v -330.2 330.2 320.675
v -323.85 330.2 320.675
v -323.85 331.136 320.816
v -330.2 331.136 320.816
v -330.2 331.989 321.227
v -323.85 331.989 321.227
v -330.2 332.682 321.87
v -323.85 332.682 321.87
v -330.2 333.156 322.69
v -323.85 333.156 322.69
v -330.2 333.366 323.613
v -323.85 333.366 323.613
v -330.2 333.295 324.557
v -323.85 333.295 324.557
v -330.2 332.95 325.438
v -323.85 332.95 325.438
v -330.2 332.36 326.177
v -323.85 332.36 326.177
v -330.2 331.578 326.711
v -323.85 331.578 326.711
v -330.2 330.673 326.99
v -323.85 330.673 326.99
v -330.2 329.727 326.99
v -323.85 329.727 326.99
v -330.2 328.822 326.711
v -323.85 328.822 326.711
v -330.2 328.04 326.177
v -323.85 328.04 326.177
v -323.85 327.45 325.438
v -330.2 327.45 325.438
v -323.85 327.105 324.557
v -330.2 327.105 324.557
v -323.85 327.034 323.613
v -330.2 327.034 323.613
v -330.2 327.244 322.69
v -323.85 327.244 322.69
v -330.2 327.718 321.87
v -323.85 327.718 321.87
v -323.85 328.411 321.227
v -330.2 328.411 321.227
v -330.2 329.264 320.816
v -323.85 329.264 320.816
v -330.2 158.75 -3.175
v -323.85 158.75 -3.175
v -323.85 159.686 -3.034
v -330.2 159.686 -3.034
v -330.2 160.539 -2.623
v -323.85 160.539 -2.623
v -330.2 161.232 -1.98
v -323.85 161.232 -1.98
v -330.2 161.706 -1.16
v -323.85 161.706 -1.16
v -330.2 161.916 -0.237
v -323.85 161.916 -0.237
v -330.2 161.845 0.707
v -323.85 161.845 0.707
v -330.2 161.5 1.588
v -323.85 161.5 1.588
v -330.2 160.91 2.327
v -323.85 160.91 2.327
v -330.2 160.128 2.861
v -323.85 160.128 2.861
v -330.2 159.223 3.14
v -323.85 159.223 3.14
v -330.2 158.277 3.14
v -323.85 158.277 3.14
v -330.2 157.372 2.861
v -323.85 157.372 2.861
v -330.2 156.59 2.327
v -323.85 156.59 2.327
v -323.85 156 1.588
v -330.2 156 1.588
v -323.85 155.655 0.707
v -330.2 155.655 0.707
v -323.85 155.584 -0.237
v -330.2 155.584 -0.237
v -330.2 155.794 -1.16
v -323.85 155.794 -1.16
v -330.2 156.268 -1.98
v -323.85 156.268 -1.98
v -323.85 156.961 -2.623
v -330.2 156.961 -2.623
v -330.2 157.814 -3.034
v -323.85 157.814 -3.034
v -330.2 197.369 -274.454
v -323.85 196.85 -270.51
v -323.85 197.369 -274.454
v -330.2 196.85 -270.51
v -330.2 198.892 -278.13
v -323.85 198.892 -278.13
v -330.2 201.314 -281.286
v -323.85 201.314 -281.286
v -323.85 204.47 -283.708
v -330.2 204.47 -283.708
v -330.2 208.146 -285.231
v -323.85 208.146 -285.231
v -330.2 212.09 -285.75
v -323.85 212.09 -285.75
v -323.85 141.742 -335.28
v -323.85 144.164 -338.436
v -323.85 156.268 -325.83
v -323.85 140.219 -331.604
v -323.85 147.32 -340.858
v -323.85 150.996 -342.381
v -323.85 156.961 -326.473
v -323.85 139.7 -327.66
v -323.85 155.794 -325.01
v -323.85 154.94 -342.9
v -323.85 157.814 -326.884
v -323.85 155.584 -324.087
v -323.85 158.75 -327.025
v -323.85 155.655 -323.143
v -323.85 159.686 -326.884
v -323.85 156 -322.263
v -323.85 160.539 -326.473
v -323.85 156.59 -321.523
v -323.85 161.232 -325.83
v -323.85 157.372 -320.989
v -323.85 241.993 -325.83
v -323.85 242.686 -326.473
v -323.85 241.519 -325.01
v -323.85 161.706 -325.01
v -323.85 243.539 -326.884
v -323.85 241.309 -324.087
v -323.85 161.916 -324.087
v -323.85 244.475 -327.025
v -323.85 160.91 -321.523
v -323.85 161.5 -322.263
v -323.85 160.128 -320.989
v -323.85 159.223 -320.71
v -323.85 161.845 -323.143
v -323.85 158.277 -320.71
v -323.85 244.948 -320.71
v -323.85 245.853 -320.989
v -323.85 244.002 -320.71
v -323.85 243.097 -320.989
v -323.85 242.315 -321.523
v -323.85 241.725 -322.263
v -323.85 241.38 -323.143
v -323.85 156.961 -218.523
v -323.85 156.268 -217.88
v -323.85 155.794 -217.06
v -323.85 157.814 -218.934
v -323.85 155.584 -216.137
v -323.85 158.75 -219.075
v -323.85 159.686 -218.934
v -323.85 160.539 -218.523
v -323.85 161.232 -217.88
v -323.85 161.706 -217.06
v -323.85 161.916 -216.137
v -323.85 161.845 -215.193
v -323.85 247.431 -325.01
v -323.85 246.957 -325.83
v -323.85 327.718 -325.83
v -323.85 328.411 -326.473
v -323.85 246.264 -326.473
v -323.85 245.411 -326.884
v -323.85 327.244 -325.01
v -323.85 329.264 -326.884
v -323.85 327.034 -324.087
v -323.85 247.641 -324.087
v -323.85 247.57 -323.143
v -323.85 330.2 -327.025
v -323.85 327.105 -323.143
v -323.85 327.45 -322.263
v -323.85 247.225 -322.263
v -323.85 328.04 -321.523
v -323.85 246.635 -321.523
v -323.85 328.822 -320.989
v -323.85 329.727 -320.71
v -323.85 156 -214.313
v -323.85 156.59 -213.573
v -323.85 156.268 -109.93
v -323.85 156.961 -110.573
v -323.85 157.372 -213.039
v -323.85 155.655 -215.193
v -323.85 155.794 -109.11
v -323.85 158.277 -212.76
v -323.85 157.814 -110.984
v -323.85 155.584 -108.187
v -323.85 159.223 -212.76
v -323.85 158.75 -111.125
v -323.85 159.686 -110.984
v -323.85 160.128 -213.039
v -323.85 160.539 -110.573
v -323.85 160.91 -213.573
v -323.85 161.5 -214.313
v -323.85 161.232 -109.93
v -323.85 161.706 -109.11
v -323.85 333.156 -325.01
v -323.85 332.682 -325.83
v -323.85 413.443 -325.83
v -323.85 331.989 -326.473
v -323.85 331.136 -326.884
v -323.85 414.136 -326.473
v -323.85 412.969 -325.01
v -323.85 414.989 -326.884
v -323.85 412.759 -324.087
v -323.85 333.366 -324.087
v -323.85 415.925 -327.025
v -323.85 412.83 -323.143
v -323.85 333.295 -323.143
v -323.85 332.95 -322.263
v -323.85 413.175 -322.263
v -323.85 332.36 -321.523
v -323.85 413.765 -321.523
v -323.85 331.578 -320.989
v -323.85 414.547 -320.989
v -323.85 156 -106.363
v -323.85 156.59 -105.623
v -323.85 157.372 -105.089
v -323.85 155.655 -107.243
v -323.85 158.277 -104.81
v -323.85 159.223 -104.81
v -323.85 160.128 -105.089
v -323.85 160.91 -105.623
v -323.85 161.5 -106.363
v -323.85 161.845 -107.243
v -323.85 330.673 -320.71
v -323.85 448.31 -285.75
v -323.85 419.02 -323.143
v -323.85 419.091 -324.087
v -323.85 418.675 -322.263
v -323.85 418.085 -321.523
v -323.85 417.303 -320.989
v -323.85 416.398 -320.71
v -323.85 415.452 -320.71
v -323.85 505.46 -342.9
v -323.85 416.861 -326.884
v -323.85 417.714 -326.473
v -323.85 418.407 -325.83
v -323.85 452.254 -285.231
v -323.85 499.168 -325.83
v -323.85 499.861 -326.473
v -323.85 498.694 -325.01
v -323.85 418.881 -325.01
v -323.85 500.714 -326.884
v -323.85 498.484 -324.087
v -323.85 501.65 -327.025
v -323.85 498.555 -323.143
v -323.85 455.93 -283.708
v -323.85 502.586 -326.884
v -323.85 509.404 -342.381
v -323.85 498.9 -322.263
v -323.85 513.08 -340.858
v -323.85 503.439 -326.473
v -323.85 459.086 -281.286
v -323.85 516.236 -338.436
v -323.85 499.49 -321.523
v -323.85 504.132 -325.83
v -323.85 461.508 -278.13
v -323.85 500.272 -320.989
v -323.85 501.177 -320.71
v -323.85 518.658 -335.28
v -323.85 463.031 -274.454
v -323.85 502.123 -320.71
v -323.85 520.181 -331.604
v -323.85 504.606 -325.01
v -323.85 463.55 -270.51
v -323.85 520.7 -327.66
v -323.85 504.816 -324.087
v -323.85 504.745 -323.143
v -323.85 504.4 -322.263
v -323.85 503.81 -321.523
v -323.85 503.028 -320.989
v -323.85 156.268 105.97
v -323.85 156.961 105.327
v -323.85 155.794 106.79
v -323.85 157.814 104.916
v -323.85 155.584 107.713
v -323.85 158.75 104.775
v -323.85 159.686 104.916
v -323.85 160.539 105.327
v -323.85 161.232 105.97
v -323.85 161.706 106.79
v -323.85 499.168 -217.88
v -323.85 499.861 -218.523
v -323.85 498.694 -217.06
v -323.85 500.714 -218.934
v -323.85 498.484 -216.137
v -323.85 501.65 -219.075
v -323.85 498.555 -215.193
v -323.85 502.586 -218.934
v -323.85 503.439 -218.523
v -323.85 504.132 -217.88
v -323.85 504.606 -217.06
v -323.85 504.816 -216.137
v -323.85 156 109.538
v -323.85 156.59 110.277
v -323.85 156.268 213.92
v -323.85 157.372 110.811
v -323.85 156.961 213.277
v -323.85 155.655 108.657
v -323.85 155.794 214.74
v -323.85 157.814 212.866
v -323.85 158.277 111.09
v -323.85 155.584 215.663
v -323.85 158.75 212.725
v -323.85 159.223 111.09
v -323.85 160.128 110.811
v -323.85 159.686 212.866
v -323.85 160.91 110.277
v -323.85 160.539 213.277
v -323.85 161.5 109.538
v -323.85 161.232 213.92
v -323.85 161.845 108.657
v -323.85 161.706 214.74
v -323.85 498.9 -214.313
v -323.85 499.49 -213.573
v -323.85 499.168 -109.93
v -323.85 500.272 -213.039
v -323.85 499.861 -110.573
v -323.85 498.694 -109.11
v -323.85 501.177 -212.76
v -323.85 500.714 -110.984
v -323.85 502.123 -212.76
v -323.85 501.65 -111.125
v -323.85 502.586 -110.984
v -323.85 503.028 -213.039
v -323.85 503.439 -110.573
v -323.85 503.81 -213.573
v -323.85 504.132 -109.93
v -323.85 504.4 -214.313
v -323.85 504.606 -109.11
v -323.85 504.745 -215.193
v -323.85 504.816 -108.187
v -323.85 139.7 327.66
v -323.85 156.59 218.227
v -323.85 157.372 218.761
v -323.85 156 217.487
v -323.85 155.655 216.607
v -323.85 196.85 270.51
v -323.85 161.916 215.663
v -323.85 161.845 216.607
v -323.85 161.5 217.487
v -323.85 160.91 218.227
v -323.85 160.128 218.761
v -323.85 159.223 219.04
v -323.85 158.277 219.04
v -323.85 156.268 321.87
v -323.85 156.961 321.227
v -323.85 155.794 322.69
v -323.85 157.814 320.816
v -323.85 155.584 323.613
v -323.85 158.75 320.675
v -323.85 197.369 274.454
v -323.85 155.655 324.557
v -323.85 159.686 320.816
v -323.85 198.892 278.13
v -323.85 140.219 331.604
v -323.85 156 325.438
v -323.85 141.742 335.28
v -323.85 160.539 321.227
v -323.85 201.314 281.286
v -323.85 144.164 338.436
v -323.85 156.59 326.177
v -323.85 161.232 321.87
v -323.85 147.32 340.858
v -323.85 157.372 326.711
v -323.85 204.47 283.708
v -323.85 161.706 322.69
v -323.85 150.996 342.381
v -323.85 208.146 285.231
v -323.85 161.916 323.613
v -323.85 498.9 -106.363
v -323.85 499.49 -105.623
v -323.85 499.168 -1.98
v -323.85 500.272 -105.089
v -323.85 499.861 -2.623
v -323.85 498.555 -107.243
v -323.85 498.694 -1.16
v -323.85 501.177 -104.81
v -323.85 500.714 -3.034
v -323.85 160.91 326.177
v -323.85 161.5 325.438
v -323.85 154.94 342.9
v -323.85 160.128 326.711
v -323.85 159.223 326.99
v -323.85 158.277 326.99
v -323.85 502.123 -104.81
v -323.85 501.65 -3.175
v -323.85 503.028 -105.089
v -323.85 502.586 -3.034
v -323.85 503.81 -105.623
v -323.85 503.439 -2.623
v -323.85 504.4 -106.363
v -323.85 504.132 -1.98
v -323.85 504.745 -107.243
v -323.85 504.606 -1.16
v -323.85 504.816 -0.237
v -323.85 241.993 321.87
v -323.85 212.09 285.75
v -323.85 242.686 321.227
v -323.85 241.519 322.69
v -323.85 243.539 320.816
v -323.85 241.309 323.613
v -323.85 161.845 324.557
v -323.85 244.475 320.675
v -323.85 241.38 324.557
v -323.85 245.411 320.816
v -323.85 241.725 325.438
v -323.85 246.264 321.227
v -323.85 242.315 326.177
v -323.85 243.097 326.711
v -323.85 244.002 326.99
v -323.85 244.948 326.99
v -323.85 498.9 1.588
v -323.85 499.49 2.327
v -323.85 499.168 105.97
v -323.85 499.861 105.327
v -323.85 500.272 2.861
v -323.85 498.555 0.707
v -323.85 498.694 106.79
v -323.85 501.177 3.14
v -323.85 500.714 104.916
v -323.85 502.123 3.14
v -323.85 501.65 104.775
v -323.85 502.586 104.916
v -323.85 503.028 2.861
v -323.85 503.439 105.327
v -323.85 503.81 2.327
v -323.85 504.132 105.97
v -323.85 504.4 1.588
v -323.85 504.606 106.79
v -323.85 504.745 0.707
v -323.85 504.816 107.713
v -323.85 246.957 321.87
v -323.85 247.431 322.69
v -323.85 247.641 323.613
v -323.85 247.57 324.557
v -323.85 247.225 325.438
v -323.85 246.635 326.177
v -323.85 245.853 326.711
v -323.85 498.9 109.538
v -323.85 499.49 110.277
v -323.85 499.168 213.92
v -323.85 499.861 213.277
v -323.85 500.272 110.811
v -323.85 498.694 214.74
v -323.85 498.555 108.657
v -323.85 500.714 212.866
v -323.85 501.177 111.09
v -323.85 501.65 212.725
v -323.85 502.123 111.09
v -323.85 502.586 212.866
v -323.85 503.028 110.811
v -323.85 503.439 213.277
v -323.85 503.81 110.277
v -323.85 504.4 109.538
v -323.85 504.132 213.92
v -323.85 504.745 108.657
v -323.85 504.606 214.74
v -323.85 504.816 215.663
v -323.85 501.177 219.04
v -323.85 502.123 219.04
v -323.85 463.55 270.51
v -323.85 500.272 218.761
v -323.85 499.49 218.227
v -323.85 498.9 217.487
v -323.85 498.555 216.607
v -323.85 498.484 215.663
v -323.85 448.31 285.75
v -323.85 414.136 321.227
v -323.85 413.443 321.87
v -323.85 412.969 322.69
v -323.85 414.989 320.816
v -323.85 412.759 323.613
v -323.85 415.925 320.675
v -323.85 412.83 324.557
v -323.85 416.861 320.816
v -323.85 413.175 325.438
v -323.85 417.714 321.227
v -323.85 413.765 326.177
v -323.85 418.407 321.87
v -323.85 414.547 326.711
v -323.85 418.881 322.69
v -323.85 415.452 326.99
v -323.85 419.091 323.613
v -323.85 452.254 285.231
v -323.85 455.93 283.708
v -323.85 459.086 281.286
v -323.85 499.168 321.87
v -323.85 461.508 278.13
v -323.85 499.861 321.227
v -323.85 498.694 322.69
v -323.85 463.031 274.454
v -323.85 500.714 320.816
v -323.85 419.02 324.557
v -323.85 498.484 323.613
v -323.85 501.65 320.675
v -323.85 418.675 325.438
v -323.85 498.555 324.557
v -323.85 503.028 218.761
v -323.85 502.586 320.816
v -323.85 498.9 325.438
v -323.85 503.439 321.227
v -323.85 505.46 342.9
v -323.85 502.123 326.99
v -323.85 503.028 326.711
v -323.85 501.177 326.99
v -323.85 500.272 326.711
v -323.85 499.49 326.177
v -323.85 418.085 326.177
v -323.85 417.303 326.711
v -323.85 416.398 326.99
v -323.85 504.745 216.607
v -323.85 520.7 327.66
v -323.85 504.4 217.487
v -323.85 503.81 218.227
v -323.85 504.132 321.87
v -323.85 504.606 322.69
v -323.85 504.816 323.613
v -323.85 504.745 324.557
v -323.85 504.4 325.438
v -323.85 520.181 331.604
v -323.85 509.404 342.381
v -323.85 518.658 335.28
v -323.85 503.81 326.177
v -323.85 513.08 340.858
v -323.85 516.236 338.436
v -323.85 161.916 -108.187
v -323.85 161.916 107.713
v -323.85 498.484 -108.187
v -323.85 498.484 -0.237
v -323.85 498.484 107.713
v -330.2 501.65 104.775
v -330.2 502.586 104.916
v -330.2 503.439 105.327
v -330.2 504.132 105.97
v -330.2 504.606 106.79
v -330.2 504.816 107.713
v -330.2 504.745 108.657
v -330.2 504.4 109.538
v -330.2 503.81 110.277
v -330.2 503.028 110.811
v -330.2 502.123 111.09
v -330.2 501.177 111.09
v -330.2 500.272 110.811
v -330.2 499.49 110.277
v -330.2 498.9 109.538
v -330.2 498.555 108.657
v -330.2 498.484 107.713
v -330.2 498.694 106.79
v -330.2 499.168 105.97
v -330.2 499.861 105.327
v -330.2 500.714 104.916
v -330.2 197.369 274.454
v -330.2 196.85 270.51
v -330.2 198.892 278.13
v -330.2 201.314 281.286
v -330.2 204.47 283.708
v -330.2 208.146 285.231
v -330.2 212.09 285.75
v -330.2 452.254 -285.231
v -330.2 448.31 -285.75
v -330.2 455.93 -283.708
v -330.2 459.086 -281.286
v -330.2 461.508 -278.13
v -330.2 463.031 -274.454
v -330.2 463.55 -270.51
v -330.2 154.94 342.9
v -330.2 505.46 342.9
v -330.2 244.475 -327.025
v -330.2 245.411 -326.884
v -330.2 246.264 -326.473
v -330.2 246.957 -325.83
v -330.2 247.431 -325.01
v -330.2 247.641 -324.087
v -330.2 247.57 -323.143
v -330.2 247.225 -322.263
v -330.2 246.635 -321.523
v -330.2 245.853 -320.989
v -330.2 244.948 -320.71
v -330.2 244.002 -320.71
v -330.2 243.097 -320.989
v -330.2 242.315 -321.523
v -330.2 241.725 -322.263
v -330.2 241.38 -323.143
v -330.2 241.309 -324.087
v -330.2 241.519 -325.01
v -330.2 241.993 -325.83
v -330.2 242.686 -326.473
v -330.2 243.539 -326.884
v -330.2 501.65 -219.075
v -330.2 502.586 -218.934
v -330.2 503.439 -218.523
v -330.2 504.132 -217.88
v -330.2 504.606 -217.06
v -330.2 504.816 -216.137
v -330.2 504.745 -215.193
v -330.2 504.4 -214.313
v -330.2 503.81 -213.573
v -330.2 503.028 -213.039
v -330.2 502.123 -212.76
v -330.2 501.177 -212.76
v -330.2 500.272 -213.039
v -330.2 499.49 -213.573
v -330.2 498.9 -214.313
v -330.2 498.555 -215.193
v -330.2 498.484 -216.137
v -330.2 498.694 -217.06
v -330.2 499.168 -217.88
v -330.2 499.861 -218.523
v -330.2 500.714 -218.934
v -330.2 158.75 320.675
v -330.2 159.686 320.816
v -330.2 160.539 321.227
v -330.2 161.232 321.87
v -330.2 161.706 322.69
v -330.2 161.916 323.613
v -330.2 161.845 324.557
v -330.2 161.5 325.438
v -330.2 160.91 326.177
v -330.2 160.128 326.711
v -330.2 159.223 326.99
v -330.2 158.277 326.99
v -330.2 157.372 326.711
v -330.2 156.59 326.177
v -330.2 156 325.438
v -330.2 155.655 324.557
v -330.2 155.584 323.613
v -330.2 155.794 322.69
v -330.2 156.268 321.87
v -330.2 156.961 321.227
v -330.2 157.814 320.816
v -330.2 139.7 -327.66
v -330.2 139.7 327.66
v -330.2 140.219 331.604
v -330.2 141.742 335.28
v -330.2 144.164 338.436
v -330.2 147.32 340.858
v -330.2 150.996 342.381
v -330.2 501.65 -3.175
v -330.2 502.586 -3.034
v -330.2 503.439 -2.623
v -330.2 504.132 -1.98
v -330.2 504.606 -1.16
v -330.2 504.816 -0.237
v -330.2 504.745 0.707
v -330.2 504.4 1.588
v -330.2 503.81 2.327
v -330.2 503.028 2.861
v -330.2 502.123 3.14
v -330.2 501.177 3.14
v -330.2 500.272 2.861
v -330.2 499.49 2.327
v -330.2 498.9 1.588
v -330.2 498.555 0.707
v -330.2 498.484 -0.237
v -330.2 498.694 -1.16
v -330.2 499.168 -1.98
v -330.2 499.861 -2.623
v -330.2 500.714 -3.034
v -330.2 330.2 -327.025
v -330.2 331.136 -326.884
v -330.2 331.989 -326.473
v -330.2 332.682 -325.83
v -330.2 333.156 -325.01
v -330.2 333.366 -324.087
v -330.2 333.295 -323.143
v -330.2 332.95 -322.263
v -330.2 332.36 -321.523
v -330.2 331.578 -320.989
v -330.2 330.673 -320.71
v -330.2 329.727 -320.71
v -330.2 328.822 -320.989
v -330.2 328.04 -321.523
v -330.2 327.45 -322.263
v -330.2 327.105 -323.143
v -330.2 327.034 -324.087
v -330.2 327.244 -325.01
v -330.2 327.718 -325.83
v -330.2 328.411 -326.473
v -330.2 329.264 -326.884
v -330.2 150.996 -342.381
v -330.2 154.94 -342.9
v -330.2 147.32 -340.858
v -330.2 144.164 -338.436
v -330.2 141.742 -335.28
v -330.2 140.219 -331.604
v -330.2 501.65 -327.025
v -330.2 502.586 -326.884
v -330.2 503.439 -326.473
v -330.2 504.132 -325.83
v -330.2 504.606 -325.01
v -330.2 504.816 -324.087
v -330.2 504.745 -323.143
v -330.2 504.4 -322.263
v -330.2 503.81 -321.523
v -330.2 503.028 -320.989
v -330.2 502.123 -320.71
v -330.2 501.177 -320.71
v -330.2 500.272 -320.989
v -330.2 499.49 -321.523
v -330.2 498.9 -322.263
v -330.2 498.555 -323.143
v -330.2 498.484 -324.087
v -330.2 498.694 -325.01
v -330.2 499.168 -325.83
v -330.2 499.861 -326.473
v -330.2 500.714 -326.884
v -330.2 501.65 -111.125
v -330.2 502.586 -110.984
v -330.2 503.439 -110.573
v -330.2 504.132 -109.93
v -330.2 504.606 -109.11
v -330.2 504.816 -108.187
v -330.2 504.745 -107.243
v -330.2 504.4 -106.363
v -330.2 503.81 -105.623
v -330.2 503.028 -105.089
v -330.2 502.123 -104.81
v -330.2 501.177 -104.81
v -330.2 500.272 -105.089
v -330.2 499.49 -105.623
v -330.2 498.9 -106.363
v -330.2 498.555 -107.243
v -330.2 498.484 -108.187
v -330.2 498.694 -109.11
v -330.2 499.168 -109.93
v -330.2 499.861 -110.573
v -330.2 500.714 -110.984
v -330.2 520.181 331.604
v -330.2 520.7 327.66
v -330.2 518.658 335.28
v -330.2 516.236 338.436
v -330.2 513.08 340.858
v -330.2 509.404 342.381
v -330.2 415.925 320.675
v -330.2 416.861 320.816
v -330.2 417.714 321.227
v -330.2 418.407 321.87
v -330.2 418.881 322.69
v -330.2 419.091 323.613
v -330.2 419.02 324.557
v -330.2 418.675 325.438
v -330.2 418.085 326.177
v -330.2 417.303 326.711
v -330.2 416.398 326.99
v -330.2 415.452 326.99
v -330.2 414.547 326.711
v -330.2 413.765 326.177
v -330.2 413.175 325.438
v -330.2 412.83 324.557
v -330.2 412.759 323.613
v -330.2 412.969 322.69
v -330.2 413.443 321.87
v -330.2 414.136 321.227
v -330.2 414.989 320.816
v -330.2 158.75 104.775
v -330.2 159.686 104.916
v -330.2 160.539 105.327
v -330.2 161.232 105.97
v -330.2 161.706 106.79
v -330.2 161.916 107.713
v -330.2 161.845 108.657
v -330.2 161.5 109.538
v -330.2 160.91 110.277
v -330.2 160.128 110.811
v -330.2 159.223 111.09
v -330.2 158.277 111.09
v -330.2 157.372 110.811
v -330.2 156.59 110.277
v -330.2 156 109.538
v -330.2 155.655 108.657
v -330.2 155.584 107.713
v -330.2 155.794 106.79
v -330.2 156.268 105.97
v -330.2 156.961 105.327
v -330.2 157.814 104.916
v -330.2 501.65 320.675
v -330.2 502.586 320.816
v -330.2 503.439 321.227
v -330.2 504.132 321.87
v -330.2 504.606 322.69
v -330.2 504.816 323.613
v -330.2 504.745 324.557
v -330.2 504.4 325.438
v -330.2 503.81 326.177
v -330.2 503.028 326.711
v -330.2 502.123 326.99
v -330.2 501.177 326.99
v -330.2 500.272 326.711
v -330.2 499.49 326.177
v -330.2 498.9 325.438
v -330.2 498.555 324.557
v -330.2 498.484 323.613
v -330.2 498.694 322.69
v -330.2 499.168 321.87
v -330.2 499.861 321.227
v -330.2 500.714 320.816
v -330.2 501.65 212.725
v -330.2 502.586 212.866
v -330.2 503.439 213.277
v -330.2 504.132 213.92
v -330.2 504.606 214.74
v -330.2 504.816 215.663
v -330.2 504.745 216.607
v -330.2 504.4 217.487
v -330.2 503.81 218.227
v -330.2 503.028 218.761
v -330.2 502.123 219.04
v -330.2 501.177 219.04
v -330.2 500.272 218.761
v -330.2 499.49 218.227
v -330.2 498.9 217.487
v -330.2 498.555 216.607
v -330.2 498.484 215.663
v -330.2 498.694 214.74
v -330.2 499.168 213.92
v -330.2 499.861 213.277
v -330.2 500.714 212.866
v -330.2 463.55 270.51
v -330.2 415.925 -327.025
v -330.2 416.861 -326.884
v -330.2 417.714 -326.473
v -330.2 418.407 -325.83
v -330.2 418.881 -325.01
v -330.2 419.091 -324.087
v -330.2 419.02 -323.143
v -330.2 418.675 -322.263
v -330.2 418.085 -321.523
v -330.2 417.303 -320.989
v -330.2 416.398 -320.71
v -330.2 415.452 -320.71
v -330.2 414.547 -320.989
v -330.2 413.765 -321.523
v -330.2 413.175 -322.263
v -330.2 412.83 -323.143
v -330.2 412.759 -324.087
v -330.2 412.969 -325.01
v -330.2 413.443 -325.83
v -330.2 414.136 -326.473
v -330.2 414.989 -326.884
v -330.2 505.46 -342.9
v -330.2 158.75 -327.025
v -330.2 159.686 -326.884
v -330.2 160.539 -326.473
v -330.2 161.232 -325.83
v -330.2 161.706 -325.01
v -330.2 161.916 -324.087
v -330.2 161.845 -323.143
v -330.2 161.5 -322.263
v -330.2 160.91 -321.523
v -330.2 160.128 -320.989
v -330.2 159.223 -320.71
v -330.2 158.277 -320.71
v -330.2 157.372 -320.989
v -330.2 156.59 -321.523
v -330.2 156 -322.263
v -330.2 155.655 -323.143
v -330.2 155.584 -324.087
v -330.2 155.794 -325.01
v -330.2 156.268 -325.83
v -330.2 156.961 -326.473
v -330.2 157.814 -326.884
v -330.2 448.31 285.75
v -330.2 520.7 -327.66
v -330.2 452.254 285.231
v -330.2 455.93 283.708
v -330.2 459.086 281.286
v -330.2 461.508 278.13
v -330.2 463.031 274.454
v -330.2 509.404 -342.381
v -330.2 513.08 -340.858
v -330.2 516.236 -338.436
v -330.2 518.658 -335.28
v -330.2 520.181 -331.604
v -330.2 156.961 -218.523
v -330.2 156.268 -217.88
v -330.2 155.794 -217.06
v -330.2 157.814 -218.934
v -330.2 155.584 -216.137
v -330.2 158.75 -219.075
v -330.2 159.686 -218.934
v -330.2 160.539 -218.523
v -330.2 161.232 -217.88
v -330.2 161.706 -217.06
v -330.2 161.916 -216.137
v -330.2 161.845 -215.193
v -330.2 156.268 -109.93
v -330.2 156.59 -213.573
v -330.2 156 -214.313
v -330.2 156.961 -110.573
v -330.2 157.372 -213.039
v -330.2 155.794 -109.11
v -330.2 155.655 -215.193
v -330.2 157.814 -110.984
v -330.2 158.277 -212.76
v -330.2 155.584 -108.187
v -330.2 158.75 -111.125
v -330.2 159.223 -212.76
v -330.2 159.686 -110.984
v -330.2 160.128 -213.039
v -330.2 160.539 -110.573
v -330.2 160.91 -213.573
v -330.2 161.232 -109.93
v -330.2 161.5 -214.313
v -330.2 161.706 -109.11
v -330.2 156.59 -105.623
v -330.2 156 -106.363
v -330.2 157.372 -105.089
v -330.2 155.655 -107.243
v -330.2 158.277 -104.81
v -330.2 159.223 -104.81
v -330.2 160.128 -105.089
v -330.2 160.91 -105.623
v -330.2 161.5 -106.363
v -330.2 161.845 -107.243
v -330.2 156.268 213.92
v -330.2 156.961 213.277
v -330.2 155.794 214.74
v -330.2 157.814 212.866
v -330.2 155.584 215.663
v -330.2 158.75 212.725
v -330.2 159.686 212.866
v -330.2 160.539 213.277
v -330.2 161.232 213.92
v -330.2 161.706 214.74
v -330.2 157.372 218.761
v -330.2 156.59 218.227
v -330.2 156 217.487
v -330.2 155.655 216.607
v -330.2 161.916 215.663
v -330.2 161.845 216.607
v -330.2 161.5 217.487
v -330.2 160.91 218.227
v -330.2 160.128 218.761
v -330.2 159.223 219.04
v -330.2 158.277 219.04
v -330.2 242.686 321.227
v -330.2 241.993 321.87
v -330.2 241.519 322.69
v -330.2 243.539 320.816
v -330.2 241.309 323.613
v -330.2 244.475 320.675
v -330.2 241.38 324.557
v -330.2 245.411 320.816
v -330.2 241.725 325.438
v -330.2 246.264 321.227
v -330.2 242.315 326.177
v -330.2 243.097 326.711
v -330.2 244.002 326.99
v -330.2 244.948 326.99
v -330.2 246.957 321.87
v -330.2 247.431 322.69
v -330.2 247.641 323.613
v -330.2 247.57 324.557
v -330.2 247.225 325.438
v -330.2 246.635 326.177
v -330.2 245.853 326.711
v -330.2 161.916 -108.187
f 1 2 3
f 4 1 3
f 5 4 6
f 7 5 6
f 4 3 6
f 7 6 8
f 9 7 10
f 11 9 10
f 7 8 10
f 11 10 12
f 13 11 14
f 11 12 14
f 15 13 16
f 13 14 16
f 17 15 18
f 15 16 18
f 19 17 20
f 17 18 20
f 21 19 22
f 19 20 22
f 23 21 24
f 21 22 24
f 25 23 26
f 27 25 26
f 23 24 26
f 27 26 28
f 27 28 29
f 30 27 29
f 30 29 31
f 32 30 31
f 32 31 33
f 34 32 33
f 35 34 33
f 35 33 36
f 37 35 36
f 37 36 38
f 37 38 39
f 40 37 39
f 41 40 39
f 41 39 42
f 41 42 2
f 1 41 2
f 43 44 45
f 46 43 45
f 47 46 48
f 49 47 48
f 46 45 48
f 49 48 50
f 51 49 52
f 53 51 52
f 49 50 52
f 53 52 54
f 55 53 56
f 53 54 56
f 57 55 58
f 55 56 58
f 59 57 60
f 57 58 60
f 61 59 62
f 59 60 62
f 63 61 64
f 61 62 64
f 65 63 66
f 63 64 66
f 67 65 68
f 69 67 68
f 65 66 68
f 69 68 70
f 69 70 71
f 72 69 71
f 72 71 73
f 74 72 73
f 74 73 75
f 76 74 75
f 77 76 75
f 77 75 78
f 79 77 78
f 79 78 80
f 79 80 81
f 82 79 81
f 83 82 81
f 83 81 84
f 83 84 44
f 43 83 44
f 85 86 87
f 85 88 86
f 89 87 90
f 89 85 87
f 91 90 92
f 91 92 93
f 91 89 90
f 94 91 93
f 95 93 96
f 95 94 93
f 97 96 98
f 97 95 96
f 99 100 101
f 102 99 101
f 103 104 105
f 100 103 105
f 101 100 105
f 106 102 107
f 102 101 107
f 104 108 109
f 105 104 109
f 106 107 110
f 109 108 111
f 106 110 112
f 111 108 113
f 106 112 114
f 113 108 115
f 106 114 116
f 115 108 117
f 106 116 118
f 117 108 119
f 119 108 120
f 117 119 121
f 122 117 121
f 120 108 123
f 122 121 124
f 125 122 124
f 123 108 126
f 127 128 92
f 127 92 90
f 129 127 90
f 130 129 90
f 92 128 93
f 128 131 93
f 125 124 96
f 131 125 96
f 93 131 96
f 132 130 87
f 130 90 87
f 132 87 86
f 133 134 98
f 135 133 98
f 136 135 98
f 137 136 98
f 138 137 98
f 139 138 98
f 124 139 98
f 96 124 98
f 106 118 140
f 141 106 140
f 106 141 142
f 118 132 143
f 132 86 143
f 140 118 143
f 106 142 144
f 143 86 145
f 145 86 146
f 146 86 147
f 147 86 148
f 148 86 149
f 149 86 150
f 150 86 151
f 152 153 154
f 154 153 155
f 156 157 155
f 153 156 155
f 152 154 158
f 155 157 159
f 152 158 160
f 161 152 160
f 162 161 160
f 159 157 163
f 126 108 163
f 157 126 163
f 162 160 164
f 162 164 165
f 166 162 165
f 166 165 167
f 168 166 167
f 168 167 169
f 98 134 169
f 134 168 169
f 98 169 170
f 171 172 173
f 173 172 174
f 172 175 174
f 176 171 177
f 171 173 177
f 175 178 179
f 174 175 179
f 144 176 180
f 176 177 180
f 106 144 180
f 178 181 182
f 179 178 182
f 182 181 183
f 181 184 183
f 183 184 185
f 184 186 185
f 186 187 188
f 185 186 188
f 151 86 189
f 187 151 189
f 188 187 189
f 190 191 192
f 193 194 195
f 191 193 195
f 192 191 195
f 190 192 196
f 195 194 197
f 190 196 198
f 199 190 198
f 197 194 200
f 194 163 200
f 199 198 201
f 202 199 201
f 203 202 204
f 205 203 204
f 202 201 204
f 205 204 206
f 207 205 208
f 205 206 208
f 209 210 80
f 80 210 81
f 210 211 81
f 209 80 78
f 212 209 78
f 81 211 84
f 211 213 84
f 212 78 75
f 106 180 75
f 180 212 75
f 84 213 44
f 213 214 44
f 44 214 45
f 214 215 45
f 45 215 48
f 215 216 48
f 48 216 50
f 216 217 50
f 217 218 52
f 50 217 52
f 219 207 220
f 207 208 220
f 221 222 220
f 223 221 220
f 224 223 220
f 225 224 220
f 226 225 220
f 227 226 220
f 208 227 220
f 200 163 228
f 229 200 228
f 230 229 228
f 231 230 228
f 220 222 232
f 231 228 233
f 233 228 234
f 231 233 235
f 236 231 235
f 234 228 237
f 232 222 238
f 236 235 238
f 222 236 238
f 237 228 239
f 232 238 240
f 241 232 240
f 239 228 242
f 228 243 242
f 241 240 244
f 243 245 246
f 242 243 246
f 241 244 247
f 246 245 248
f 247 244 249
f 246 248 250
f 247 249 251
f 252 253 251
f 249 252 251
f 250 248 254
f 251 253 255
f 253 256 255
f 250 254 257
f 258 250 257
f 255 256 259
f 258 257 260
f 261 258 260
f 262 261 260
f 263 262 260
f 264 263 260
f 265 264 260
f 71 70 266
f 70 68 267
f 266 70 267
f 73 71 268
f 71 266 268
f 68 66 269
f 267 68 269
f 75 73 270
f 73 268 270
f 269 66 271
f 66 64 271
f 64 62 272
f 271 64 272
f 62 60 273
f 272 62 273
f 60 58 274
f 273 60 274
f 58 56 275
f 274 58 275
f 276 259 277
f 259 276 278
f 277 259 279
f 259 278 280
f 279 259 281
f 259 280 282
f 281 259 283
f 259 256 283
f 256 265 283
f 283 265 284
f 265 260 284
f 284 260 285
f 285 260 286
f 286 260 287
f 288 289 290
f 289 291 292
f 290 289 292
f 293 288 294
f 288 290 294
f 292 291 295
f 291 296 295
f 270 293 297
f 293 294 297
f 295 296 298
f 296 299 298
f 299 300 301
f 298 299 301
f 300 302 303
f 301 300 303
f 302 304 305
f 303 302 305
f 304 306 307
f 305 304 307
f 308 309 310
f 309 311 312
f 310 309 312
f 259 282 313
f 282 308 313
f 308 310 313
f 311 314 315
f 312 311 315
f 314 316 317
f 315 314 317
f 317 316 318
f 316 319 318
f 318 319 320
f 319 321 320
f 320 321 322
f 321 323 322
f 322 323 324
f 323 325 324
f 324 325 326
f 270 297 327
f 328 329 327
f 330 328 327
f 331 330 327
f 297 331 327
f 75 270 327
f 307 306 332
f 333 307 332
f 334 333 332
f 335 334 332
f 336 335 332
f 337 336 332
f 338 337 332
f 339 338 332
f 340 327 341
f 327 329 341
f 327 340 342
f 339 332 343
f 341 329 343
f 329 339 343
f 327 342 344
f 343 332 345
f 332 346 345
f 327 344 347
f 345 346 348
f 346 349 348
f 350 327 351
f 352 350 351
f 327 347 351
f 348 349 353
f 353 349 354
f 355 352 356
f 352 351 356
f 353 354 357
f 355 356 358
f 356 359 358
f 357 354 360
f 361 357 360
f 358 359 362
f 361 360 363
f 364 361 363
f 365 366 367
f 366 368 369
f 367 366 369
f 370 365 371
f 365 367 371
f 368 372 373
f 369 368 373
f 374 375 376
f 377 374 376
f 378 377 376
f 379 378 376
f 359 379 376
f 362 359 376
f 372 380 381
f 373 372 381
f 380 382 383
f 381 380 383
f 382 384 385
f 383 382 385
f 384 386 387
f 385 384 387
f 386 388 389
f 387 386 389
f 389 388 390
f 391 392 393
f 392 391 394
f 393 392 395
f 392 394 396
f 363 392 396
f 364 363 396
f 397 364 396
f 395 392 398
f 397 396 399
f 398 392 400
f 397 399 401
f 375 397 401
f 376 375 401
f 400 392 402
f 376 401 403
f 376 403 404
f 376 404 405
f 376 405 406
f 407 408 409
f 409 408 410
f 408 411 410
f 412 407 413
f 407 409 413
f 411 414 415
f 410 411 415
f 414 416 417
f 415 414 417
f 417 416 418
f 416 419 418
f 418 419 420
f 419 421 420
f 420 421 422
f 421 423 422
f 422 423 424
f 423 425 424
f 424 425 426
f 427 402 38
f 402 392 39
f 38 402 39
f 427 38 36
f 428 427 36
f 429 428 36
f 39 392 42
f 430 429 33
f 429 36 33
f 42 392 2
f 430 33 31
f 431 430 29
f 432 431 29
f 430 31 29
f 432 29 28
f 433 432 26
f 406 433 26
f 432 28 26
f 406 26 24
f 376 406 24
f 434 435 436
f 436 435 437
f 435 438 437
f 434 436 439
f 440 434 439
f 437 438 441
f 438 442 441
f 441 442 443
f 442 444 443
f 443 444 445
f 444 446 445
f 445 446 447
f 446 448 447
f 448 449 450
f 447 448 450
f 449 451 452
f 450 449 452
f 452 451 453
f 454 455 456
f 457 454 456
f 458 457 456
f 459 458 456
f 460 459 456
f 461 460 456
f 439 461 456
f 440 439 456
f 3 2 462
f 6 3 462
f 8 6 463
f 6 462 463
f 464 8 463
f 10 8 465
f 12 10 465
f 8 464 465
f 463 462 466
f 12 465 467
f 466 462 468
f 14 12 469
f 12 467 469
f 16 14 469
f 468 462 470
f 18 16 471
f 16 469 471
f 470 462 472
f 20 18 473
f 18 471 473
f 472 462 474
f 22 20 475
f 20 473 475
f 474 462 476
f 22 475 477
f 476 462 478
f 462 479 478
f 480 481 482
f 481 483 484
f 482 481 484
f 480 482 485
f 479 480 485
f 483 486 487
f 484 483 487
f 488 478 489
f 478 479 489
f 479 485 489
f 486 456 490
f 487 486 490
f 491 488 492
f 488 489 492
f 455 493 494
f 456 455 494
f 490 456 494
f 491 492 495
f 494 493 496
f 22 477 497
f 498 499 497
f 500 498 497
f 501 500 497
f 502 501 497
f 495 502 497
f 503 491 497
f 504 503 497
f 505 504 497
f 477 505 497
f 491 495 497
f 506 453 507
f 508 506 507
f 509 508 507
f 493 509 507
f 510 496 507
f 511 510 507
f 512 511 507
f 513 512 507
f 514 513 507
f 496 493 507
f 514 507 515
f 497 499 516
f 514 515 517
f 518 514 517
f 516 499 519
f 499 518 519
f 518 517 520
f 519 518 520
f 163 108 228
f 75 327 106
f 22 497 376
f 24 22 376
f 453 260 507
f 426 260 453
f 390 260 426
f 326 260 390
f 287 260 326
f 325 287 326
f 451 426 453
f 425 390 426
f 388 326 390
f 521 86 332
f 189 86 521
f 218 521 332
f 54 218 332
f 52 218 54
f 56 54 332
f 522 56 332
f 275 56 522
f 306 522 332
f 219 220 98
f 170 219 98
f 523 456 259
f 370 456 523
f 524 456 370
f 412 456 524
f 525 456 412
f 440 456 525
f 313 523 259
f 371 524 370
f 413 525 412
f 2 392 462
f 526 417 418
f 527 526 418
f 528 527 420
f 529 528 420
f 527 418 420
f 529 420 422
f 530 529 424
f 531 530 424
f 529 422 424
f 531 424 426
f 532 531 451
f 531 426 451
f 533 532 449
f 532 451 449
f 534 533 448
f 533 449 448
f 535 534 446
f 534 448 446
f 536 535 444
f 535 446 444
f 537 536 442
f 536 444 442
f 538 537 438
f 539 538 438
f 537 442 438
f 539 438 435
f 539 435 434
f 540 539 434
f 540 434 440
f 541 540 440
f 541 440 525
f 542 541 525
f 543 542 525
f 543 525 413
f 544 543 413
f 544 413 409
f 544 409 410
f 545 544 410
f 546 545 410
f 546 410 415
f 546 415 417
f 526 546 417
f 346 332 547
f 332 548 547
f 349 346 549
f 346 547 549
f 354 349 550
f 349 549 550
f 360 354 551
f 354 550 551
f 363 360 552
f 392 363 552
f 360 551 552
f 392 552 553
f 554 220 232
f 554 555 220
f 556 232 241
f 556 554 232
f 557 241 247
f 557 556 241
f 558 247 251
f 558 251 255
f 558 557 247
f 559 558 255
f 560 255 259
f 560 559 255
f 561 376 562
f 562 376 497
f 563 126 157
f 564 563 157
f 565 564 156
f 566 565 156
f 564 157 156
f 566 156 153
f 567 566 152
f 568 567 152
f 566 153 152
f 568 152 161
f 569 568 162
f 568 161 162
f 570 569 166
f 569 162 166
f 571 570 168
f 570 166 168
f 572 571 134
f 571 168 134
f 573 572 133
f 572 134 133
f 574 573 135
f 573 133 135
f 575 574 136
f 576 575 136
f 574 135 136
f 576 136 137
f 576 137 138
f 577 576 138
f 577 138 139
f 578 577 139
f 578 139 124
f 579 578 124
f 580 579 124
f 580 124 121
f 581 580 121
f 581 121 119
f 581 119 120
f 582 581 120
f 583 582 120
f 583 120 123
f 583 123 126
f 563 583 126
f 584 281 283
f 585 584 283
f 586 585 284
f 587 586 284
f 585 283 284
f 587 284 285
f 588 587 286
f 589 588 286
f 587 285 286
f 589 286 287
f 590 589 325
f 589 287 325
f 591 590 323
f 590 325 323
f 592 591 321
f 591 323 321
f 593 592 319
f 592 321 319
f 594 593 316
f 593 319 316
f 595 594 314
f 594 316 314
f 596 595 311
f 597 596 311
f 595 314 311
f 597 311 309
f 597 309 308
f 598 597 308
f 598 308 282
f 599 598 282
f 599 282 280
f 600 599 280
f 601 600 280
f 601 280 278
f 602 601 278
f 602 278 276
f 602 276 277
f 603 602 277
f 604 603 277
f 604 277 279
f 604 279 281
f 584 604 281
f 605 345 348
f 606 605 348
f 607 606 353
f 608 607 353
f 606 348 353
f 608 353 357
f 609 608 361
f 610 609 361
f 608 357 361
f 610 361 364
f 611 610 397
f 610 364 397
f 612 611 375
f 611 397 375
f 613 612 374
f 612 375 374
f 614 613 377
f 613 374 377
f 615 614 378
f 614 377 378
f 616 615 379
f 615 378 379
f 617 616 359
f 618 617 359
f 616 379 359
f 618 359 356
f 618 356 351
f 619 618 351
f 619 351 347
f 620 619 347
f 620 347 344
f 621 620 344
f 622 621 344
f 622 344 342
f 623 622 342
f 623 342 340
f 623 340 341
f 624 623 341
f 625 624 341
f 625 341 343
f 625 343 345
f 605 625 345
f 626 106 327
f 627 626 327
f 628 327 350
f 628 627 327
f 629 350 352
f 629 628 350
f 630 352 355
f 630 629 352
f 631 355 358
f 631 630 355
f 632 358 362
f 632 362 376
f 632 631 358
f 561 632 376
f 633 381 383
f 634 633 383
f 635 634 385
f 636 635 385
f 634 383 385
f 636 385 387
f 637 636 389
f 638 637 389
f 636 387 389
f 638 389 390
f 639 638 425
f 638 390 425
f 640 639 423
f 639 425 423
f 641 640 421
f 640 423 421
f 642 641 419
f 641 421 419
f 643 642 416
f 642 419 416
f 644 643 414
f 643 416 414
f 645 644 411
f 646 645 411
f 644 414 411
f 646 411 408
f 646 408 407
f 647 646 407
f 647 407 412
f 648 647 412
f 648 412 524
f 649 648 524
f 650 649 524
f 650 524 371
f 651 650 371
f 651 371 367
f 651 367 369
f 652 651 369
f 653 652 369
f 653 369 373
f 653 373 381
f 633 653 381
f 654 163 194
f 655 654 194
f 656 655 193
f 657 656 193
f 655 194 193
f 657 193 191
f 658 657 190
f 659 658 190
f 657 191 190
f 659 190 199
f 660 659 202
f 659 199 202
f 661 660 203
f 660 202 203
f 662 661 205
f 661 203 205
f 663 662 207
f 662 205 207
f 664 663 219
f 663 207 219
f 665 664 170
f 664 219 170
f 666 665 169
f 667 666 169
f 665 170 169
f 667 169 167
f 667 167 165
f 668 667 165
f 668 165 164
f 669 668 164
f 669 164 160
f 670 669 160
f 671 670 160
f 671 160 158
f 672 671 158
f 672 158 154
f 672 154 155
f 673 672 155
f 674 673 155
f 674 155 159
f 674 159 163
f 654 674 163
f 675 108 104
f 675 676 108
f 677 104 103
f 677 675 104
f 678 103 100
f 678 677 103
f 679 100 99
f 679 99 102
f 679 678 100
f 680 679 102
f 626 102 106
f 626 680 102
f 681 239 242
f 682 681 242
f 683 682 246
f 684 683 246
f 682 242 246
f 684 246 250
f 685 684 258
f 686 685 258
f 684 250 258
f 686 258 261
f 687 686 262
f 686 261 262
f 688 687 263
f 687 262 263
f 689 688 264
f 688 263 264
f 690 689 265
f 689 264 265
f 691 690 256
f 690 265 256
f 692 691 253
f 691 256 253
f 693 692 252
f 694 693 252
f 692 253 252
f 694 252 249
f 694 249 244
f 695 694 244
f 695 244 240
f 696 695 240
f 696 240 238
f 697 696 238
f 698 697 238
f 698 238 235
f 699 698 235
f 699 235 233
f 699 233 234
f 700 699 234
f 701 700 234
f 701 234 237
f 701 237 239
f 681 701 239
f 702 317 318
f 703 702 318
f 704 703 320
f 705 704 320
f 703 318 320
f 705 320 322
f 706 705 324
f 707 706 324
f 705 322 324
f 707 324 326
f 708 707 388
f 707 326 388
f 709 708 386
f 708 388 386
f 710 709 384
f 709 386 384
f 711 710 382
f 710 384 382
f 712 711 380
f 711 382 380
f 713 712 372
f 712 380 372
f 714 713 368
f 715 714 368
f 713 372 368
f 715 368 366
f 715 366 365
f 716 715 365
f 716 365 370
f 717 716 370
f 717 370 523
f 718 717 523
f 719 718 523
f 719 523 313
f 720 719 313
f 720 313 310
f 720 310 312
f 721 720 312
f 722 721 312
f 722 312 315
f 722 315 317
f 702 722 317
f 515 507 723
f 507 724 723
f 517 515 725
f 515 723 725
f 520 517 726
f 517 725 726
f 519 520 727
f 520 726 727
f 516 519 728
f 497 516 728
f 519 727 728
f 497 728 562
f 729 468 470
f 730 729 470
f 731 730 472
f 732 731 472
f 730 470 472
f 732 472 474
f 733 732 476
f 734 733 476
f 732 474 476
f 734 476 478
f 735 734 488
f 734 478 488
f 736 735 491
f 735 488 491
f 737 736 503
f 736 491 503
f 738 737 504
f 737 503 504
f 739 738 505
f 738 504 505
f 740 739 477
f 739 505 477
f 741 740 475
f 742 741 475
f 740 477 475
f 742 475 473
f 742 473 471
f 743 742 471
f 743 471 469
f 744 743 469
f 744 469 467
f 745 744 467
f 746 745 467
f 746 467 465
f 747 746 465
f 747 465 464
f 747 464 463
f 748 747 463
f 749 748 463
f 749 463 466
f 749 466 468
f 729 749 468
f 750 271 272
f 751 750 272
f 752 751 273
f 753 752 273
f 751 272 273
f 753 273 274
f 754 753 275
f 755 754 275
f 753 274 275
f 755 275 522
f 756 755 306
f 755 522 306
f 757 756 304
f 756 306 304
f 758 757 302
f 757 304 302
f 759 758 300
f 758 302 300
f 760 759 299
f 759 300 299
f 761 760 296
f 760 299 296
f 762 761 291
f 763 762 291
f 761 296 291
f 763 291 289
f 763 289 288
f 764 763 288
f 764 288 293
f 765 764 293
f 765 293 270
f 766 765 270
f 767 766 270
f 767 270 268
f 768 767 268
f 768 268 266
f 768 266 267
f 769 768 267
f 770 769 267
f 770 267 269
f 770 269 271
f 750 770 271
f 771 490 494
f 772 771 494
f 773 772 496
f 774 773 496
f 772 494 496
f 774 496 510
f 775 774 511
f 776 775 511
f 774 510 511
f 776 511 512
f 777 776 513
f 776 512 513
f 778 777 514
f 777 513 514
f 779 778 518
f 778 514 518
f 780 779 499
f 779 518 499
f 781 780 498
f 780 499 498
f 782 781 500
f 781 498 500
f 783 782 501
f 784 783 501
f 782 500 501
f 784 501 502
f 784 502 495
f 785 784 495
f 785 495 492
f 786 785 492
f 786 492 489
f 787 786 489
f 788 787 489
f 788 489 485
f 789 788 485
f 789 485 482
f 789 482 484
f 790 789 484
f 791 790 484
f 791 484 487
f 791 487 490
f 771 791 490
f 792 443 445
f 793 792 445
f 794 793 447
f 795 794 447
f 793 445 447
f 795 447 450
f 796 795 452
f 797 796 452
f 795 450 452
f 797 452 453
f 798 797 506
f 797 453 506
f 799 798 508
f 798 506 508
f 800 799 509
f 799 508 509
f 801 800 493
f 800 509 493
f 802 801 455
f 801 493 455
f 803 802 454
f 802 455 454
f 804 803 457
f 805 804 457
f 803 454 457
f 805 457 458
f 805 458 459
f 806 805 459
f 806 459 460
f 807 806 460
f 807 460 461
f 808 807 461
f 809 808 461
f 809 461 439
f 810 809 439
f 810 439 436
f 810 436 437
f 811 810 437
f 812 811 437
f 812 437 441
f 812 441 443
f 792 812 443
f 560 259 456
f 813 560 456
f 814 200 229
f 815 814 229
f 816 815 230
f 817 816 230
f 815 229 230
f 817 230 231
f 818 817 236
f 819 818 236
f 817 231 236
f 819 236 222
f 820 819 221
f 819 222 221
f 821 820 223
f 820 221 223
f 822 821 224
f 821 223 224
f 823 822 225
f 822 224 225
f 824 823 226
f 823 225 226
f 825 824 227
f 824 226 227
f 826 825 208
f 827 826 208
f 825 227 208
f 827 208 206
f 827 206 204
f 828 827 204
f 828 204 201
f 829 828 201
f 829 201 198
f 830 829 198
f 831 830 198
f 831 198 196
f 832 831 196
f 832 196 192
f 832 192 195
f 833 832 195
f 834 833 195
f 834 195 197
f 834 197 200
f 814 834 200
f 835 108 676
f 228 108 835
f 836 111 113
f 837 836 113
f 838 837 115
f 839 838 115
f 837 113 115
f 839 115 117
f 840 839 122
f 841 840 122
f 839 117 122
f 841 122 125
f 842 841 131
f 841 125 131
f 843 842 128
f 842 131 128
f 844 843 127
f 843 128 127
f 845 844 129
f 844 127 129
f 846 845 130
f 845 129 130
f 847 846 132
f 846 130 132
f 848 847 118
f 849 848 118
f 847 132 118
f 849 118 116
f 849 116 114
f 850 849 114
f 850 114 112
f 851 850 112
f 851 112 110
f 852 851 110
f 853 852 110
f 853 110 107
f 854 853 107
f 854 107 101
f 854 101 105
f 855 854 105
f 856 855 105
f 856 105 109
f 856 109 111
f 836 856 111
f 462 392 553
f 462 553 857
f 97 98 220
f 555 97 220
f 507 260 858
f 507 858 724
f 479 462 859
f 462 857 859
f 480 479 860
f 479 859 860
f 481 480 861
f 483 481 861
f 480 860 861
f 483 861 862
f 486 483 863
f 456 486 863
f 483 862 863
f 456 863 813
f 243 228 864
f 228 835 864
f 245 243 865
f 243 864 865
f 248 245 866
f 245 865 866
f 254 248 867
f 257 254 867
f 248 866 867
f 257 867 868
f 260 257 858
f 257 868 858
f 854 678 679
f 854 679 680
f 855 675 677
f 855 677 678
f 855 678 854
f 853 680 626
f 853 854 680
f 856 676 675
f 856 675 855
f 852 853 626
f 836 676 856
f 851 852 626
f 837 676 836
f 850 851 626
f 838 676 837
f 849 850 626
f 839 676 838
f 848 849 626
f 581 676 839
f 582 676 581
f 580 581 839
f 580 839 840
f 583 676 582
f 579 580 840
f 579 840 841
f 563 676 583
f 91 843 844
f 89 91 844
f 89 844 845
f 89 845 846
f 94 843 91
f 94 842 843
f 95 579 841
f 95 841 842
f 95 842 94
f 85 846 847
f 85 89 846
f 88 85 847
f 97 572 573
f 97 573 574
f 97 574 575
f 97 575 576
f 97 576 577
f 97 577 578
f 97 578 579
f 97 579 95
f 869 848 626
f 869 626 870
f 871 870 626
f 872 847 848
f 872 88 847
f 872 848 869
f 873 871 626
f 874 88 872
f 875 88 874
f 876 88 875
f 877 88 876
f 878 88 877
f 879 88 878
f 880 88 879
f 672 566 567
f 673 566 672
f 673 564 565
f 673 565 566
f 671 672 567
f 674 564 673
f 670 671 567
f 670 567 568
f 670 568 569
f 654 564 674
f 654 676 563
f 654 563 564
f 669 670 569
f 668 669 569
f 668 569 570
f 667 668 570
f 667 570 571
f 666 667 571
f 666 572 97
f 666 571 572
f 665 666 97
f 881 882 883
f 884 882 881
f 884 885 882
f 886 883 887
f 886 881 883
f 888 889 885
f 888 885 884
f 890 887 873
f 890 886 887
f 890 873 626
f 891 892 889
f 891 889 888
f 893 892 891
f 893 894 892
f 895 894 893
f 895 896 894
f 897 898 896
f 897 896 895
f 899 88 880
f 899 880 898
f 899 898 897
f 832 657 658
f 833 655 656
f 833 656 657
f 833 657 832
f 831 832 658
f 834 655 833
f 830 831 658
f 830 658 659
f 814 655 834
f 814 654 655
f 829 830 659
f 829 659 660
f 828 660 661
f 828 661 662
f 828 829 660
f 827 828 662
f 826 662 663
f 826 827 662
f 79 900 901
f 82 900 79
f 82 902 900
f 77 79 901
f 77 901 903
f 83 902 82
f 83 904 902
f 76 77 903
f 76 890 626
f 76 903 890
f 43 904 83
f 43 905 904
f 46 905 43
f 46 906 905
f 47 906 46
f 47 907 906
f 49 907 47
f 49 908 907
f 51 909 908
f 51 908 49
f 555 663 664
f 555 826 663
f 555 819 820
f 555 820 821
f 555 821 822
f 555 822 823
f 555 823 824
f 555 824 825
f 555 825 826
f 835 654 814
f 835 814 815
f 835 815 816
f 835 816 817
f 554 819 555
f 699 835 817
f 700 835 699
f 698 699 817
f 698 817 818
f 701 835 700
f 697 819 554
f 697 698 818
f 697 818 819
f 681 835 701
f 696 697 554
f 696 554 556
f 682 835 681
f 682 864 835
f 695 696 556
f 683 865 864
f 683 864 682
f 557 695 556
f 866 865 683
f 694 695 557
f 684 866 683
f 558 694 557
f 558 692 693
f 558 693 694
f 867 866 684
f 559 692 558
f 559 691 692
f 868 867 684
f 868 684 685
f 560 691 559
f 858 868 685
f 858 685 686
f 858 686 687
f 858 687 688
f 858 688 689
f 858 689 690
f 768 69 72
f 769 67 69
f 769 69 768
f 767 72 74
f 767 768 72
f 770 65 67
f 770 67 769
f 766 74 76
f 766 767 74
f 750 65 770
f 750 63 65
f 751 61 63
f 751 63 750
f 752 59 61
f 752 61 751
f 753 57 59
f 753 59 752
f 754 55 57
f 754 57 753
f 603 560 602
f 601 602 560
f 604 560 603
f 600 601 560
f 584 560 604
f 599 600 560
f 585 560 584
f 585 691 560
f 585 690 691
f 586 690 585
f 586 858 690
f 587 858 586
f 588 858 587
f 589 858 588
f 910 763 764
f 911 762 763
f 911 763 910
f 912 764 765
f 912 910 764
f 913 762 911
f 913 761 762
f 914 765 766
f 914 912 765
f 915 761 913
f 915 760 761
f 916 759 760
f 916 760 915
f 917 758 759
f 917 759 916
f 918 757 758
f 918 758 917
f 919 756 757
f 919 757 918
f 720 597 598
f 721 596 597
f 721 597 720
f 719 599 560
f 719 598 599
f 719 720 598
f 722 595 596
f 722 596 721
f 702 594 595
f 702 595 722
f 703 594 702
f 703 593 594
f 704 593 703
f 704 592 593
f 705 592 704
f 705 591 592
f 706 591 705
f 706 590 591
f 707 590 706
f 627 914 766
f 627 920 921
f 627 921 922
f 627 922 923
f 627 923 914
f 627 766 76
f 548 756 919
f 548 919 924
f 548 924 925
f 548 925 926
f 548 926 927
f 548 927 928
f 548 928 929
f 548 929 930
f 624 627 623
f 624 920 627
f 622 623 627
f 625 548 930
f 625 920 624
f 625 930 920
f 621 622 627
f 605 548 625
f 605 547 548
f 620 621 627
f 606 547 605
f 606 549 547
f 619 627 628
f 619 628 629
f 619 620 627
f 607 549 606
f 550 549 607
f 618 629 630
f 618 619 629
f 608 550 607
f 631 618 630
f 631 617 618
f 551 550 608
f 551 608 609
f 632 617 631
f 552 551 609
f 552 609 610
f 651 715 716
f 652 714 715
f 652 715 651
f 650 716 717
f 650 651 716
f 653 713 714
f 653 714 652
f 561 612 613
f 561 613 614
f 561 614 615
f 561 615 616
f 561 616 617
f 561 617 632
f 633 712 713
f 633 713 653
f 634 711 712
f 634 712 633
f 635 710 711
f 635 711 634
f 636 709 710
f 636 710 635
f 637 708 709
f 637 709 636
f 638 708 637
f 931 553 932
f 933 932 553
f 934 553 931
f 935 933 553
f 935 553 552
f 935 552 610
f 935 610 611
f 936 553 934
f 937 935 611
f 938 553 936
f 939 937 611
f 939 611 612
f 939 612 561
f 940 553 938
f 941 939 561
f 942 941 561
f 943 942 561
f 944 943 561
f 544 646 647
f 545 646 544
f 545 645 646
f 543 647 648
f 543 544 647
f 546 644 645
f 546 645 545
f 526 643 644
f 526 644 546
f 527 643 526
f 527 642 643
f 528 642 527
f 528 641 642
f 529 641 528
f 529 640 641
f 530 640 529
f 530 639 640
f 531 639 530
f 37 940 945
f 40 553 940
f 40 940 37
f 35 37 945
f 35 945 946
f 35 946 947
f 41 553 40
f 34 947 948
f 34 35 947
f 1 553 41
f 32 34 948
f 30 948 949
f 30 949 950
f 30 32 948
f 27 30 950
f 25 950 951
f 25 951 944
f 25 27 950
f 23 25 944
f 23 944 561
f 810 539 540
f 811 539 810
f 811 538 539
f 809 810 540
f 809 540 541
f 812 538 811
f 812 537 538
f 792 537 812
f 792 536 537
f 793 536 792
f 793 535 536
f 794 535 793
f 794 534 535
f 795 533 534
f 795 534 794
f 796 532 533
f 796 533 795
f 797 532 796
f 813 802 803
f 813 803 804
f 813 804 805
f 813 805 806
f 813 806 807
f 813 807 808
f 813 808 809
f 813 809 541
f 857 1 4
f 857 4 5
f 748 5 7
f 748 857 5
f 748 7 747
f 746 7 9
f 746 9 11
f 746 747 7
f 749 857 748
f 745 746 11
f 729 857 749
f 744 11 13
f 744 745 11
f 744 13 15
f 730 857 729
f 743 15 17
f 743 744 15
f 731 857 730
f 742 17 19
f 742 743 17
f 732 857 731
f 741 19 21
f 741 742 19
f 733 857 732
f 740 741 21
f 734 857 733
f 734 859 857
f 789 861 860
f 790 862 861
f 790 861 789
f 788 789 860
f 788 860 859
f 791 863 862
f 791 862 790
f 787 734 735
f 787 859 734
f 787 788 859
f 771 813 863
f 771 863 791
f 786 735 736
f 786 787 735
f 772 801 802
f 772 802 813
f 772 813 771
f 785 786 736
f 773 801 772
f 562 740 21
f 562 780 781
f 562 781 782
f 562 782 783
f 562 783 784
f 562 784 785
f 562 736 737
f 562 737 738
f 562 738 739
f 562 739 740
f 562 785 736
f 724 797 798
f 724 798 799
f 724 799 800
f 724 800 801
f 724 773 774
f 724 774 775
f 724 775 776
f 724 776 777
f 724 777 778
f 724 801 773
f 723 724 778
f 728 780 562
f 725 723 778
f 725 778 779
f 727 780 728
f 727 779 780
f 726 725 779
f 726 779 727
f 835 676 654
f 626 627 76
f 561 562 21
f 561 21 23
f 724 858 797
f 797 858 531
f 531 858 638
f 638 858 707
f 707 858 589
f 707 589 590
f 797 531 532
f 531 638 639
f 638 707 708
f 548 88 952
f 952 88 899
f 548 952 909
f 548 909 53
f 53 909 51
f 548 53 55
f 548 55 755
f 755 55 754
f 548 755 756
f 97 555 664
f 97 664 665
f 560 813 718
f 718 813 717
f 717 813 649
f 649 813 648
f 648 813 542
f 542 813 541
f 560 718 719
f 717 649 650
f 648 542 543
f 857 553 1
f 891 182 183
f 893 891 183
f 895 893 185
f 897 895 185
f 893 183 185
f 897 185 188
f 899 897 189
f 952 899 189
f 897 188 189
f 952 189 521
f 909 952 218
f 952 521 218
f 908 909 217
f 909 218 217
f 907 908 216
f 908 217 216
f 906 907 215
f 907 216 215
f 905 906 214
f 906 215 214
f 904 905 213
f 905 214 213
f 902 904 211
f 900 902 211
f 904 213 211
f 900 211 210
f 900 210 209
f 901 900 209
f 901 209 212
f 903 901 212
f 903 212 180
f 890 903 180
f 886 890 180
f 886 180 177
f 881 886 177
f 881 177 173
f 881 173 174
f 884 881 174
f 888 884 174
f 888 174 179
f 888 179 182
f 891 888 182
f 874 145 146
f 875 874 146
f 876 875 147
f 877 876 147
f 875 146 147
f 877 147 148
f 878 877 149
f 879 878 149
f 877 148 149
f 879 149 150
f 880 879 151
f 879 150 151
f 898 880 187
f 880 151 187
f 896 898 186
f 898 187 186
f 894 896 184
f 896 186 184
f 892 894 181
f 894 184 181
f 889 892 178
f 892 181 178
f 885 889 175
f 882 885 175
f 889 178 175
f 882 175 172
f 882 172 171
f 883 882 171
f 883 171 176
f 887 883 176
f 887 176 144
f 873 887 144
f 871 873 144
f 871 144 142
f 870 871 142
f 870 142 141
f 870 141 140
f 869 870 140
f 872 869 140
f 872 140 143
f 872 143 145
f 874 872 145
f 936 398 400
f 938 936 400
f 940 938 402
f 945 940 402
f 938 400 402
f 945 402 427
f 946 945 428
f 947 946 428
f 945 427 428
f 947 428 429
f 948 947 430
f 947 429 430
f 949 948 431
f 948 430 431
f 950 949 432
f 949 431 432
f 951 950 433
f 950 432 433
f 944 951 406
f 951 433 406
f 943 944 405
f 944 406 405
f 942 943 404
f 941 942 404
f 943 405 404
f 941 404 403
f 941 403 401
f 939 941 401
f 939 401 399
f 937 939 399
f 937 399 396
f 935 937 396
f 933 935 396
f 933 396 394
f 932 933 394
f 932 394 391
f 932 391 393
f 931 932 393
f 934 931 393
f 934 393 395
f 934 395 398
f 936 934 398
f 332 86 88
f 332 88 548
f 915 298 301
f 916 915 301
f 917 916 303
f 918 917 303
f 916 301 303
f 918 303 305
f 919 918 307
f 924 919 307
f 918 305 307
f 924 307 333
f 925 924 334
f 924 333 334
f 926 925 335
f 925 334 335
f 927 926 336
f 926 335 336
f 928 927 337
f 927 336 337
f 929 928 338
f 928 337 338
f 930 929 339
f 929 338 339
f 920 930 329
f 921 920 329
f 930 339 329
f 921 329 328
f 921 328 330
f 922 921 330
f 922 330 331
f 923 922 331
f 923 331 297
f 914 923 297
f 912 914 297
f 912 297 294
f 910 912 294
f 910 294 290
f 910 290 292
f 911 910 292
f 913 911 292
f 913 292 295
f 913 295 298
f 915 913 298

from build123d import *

# Parameters (mm, degrees)
BOSS_EXTRUDE1_START         = 12.7
SKETCH1_W                   = 685.8
SKETCH1_H                   = 381
SKETCH1_W_2                 = 571.5
SKETCH1_H_2                 = 266.7
BOSS_EXTRUDE1_DEPTH         = 6.35
F_1_4_0_25_DIAMETER_HOLE1_D = 6.35
LPATTERN2_COUNT             = 7
LPATTERN2_PITCH             = 107.95
LPATTERN2_COUNT_DIR2        = 5
LPATTERN2_PITCH_DIR2        = 85.725
FILLET1_R                   = 15.24


with BuildPart() as part:
    # Sketch1 → Boss-Extrude1 (new body)
    with BuildSketch(Plane.ZY.offset(311.15).offset(BOSS_EXTRUDE1_START)):
        with Locations((0, 330.2)):
            Rectangle(SKETCH1_W, SKETCH1_H)
        with Locations((0, 330.2)):
            Rectangle(SKETCH1_W_2, SKETCH1_H_2, mode=Mode.SUBTRACT)
    extrude(amount=BOSS_EXTRUDE1_DEPTH)

    # 1/4 (0.25) Diameter Hole1 (through all)
    with Locations(Plane.ZY.offset(330.2)):
        with Locations((-323.85, 158.75)):
            f_1_4_0_25_diameter_hole1 = Hole(F_1_4_0_25_DIAMETER_HOLE1_D / 2)

    # LPattern2: 1_4 _0.25_ Diameter Hole1 7 × 5, 15 skipped
    with Locations(*[(0, j * LPATTERN2_PITCH_DIR2, i * LPATTERN2_PITCH) for i in range(LPATTERN2_COUNT) for j in range(LPATTERN2_COUNT_DIR2) if (i, j) not in ((0, 0), (1, 1), (1, 2), (1, 3), (2, 1), (2, 2), (2, 3), (3, 1), (3, 2), (3, 3), (4, 1), (4, 2), (4, 3), (5, 1), (5, 2), (5, 3))]):
        add(f_1_4_0_25_diameter_hole1, mode=Mode.SUBTRACT)

    # Fillet1
    fillet1_edges = [part.edges().sort_by_distance(p)[0] for p in [
        (-327.025, 463.55, -285.75),
        (-327.025, 196.85, -285.75),
        (-327.025, 196.85, 285.75),
        (-327.025, 463.55, 285.75),
        (-327.025, 520.7, -342.9),
        (-327.025, 520.7, 342.9),
        (-327.025, 139.7, 342.9),
        (-327.025, 139.7, -342.9),
    ]]
    fillet(fillet1_edges, radius=FILLET1_R)


solid = part.part
